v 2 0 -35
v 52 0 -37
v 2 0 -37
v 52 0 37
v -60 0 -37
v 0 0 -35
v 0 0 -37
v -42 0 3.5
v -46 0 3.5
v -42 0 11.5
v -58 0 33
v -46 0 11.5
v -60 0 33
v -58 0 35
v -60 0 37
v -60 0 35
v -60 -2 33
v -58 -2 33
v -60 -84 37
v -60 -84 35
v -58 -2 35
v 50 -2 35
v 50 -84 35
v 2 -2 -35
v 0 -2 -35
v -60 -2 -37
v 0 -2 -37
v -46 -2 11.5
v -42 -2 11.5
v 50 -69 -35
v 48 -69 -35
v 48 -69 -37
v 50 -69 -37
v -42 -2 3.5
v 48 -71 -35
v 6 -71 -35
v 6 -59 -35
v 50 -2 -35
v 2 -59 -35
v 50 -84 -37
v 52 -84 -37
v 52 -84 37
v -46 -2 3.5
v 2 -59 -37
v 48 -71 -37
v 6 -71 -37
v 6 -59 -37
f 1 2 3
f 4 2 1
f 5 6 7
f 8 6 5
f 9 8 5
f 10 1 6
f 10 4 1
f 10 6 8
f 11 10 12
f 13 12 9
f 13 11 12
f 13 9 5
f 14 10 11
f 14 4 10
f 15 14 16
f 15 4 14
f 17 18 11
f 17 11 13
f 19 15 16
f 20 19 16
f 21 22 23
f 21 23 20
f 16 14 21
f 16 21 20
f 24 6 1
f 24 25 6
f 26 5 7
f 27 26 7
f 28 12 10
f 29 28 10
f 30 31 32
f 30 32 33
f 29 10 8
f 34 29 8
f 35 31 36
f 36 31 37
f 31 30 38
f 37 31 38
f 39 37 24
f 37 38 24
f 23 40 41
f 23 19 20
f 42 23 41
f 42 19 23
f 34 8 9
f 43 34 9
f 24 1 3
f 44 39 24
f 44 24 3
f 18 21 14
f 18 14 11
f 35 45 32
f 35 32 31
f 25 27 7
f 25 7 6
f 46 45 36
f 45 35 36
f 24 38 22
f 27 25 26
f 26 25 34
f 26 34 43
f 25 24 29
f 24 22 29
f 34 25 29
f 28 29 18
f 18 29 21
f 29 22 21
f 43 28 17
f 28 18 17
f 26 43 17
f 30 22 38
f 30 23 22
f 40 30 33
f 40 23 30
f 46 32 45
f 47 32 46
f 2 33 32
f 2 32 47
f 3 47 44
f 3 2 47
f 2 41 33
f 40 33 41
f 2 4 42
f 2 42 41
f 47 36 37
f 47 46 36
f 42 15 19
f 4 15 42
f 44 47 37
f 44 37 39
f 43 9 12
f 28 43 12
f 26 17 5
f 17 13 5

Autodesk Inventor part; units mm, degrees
ref_plane "YZ Plane" through (0, 0, 0) normal (1, 0, 0) x (0, 1, 0)
ref_plane "XZ Plane" through (0, 0, 0) normal (0, 1, 0) x (-1, 0, 0)
ref_plane "XY Plane" through (0, 0, 0) normal (0, 0, 1) x (1, 0, 0)
sketch "Sketch1" plane through (0, 0, 0) normal (0, 1, 0) x (-1, 0, 0)
  line L0 (58, 35) -> (-50, 35)
  line L1 (-50, 35) -> (-50, -35)
  line L2 (-50, -35) -> (58, -35)
  line L3 (58, -35) -> (58, 35)
  point P0 (0, 0)
  dimension "d1" = 70
  dimension "d36" = 50
  dimension "d37" = 58
  dimension "d38" = 35
extrude "Extrusion1" add sketch "Sketch1" against normal blind 2
sketch "Sketch2" plane through (0, 0, 0) normal (0, 1, 0) x (-1, 0, 0)
  line L0 (-50, 35) -> (58, 35) projected
  line L1 (58, 35) -> (-50, 35)
  line L2 (-50, 35) -> (-50, 37)
  line L3 (-50, 37) -> (58, 37)
  line L4 (58, 37) -> (58, 35)
  point P0 (0, 0)
  dimension "d4" = 2
extrude "Extrusion2" add sketch "Sketch2" against normal blind 84
sketch "Sketch3" plane through (0, 0, 0) normal (0, 1, 0) x (-1, 0, 0)
  line L0 (58, -35) -> (-50, -35) projected
  line L1 (-50, -35) -> (-52, -35)
  line L2 (-52, -35) -> (-52, 37)
  line L3 (-52, 37) -> (-50, 37)
  line L4 (-50, 37) -> (-50, -35)
  point P0 (0, 0)
  dimension "d7" = 2
extrude "Extrusion3" add sketch "Sketch3" against normal blind 84
sketch "Sketch4" plane through (0, 0, 0) normal (0, 1, 0) x (-1, 0, 0)
  line L0 (-50, -35) -> (-52, -35) projected
  line L1 (-52, -35) -> (-2, -35)
  line L2 (-2, -35) -> (-2, -37)
  line L3 (-2, -37) -> (-52, -37)
  line L4 (-52, -37) -> (-52, -35)
  point P0 (0, 0)
  dimension "d10" = 50
  dimension "d11" = 2
extrude "Extrusion4" add sketch "Sketch4" against normal blind 71
sketch "Sketch5" plane through (52, 0, -37) normal (0, 0, -1) x (-1, 0, 0)
  line L0 (50, -2) -> (50, -71) projected
  line L1 (50, -71) -> (46, -71)
  line L2 (46, -71) -> (46, -59)
  line L3 (46, -59) -> (50, -59)
  line L4 (50, -59) -> (50, -71)
  point P0 (52, 0)
  dimension "d14" = 4
  dimension "d15" = 12
extrude "Extrusion5" cut sketch "Sketch5" against normal blind 3
sketch "Sketch6" plane through (0, 0, 0) normal (0, 1, 0) x (-1, 0, 0)
  line L0 (58, -35) -> (58, 37) projected
  line L1 (58, 37) -> (60, 37)
  line L2 (60, 37) -> (60, -37)
  line L3 (-2, -37) -> (-2, -35) projected
  line L4 (60, -37) -> (-2, -37)
  line L5 (58, -35) -> (-2, -35) projected
  line L6 (-2, -37) -> (-2, -35)
  point P0 (0, 0)
  dimension "d18" = 2
extrude "Extrusion6" add sketch "Sketch6" against normal blind 2
sketch "Sketch7" plane through (0, -2, 0) normal (0, -1, 0) x (1, 0, 0)
  line L0 (2, -35) -> (2, -37) projected
  line L1 (2, -37) -> (0, -37)
  line L2 (0, -37) -> (0, -35)
  line L3 (0, -35) -> (2, -35)
  line L4 (2, -35) -> (2, -37)
  line L5 (2, -37) -> (2, -35) projected
  point P0 (0, 0)
  point P1 (1, -37)
  point P2 (1, -35)
  point P3 (2, -36)
  point P4 (0, -36)
  dimension "d21" = 2
  dimension "d22" = 2
sketch "Sketch8" plane through (0, -2, 0) normal (0, -1, 0) x (1, 0, 0)
  line L0 (50, 35) -> (-58, 35) projected
  line L1 (-60, 37) -> (-60, -37) projected
  line L2 (-58, 35) -> (-60, 35)
  line L3 (-60, 35) -> (-60, 37)
  line L4 (-60, 37) -> (-58, 37)
  line L5 (-58, 37) -> (-58, 35)
  point P0 (0, 0)
extrude "Extrusion7" add sketch "Sketch8" along normal blind 82
sketch "Sketch9" plane through (0, -2, 0) normal (0, -1, 0) x (1, 0, 0)
  line L0 (-60, 37) -> (-60, 35) projected
  line L1 (-60, 35) -> (-58, 35)
  line L2 (-58, 35) -> (-58, 33)
  line L3 (-58, 33) -> (-60, 33)
  line L4 (-60, 33) -> (-60, 35)
  point P0 (0, 0)
  dimension "d25" = 2
  dimension "d26" = 2
extrude "Extrusion8" cut sketch "Sketch9" against normal blind 2
extrude "Extrusion9" cut sketch "Sketch7" against normal blind 2
sketch "Sketch10" plane through (0, -71, 0) normal (0, -1, 0) x (1, 0, 0)
  line L0 (52, 37) -> (52, -37) projected
  line L1 (2, -35) -> (50, -35) projected
  line L2 (52, -37) -> (50, -37)
  line L3 (50, -37) -> (50, -35)
  line L4 (50, -35) -> (52, -35)
  line L5 (52, -35) -> (52, -37)
  point P0 (0, 0)
extrude "Extrusion10" add sketch "Sketch10" along normal blind 13
sketch "Sketch11" plane through (0, -71, 0) normal (0, -1, 0) x (1, 0, 0)
  line L0 (50, 35) -> (50, -37) projected
  line L1 (50, -35) -> (6, -35) projected
  line L2 (50, -37) -> (48, -37)
  line L3 (48, -37) -> (48, -35)
  line L4 (48, -35) -> (50, -35)
  line L5 (50, -35) -> (50, -37)
  point P0 (0, 0)
  dimension "d33" = 2
extrude "Extrusion11" cut sketch "Sketch11" against normal blind 2
sketch "Sketch12" plane through (0, 0, 0) normal (0, 1, 0) x (1, 0, 0)
  line L0 (-42, -3.5) -> (-46, -3.5)
  line L1 (-46, -3.5) -> (-46, -11.5)
  line L2 (-46, -11.5) -> (-42, -11.5)
  line L3 (-42, -11.5) -> (-42, -3.5)
  line L4 (-42, -3.5) -> (-46, -11.5) construction
  line L5 (-46, -3.5) -> (-42, -11.5) construction
  line L6 (0, 37) -> (-60, 37) projected
  line L7 (-60, 37) -> (-60, -33) projected
  point P0 (0, 0)
  point P1 (-44, -7.5)
  dimension "d39" = 44.5
  dimension "d41" = 4
  dimension "d42" = 8
  dimension "d43" = 14
extrude "Extrusion12" cut sketch "Sketch12" against normal blind 10
properties part number "lid_3DPrint"
